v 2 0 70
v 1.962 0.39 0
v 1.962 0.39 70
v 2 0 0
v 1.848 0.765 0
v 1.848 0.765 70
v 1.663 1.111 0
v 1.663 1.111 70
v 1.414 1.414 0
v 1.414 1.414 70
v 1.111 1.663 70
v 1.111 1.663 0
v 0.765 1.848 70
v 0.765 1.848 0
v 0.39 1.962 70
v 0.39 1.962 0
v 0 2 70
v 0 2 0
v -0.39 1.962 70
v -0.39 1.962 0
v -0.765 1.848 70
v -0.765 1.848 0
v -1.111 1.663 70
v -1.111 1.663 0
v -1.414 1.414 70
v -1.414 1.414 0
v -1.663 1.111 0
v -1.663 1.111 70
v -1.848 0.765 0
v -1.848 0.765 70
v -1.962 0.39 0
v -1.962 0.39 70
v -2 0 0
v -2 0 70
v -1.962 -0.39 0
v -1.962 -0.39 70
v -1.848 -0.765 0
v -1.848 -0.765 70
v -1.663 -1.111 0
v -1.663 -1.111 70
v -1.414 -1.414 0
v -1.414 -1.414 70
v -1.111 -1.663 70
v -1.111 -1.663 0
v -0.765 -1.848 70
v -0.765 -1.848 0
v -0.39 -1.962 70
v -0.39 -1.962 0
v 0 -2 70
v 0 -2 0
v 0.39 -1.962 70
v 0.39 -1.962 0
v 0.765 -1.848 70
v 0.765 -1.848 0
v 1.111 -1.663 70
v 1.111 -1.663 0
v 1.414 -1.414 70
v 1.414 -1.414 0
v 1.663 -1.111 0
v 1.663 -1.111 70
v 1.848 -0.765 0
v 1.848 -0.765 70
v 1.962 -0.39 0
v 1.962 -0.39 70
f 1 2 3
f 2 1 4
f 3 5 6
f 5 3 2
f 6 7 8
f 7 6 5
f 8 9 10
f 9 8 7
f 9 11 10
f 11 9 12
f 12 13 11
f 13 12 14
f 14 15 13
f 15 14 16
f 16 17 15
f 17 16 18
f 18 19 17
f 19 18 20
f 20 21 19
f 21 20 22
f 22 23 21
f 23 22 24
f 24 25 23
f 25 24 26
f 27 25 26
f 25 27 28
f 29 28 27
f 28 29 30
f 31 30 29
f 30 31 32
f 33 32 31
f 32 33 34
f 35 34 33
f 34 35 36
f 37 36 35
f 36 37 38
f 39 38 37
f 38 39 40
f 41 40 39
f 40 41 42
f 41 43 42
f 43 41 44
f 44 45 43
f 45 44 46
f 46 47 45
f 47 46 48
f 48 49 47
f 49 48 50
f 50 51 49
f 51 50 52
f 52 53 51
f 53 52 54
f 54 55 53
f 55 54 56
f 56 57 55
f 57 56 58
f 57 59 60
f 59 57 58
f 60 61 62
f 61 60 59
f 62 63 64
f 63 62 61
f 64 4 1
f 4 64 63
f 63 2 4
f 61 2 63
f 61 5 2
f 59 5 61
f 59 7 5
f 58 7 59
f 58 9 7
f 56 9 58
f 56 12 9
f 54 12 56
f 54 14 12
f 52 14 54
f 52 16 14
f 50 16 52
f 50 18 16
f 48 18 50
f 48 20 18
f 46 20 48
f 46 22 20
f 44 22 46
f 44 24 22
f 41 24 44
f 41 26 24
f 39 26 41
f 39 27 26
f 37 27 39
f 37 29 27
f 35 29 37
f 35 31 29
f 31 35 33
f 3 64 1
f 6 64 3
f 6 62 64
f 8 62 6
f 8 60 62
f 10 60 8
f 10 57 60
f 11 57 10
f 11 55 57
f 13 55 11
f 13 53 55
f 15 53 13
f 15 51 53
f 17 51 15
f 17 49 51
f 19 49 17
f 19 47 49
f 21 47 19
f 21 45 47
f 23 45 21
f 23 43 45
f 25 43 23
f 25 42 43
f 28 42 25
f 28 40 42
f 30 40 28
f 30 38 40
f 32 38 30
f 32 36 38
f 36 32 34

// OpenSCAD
// Concept only. Provisional dimensions in mm.
$fn=32;
cylinder(h=70,r=2);
